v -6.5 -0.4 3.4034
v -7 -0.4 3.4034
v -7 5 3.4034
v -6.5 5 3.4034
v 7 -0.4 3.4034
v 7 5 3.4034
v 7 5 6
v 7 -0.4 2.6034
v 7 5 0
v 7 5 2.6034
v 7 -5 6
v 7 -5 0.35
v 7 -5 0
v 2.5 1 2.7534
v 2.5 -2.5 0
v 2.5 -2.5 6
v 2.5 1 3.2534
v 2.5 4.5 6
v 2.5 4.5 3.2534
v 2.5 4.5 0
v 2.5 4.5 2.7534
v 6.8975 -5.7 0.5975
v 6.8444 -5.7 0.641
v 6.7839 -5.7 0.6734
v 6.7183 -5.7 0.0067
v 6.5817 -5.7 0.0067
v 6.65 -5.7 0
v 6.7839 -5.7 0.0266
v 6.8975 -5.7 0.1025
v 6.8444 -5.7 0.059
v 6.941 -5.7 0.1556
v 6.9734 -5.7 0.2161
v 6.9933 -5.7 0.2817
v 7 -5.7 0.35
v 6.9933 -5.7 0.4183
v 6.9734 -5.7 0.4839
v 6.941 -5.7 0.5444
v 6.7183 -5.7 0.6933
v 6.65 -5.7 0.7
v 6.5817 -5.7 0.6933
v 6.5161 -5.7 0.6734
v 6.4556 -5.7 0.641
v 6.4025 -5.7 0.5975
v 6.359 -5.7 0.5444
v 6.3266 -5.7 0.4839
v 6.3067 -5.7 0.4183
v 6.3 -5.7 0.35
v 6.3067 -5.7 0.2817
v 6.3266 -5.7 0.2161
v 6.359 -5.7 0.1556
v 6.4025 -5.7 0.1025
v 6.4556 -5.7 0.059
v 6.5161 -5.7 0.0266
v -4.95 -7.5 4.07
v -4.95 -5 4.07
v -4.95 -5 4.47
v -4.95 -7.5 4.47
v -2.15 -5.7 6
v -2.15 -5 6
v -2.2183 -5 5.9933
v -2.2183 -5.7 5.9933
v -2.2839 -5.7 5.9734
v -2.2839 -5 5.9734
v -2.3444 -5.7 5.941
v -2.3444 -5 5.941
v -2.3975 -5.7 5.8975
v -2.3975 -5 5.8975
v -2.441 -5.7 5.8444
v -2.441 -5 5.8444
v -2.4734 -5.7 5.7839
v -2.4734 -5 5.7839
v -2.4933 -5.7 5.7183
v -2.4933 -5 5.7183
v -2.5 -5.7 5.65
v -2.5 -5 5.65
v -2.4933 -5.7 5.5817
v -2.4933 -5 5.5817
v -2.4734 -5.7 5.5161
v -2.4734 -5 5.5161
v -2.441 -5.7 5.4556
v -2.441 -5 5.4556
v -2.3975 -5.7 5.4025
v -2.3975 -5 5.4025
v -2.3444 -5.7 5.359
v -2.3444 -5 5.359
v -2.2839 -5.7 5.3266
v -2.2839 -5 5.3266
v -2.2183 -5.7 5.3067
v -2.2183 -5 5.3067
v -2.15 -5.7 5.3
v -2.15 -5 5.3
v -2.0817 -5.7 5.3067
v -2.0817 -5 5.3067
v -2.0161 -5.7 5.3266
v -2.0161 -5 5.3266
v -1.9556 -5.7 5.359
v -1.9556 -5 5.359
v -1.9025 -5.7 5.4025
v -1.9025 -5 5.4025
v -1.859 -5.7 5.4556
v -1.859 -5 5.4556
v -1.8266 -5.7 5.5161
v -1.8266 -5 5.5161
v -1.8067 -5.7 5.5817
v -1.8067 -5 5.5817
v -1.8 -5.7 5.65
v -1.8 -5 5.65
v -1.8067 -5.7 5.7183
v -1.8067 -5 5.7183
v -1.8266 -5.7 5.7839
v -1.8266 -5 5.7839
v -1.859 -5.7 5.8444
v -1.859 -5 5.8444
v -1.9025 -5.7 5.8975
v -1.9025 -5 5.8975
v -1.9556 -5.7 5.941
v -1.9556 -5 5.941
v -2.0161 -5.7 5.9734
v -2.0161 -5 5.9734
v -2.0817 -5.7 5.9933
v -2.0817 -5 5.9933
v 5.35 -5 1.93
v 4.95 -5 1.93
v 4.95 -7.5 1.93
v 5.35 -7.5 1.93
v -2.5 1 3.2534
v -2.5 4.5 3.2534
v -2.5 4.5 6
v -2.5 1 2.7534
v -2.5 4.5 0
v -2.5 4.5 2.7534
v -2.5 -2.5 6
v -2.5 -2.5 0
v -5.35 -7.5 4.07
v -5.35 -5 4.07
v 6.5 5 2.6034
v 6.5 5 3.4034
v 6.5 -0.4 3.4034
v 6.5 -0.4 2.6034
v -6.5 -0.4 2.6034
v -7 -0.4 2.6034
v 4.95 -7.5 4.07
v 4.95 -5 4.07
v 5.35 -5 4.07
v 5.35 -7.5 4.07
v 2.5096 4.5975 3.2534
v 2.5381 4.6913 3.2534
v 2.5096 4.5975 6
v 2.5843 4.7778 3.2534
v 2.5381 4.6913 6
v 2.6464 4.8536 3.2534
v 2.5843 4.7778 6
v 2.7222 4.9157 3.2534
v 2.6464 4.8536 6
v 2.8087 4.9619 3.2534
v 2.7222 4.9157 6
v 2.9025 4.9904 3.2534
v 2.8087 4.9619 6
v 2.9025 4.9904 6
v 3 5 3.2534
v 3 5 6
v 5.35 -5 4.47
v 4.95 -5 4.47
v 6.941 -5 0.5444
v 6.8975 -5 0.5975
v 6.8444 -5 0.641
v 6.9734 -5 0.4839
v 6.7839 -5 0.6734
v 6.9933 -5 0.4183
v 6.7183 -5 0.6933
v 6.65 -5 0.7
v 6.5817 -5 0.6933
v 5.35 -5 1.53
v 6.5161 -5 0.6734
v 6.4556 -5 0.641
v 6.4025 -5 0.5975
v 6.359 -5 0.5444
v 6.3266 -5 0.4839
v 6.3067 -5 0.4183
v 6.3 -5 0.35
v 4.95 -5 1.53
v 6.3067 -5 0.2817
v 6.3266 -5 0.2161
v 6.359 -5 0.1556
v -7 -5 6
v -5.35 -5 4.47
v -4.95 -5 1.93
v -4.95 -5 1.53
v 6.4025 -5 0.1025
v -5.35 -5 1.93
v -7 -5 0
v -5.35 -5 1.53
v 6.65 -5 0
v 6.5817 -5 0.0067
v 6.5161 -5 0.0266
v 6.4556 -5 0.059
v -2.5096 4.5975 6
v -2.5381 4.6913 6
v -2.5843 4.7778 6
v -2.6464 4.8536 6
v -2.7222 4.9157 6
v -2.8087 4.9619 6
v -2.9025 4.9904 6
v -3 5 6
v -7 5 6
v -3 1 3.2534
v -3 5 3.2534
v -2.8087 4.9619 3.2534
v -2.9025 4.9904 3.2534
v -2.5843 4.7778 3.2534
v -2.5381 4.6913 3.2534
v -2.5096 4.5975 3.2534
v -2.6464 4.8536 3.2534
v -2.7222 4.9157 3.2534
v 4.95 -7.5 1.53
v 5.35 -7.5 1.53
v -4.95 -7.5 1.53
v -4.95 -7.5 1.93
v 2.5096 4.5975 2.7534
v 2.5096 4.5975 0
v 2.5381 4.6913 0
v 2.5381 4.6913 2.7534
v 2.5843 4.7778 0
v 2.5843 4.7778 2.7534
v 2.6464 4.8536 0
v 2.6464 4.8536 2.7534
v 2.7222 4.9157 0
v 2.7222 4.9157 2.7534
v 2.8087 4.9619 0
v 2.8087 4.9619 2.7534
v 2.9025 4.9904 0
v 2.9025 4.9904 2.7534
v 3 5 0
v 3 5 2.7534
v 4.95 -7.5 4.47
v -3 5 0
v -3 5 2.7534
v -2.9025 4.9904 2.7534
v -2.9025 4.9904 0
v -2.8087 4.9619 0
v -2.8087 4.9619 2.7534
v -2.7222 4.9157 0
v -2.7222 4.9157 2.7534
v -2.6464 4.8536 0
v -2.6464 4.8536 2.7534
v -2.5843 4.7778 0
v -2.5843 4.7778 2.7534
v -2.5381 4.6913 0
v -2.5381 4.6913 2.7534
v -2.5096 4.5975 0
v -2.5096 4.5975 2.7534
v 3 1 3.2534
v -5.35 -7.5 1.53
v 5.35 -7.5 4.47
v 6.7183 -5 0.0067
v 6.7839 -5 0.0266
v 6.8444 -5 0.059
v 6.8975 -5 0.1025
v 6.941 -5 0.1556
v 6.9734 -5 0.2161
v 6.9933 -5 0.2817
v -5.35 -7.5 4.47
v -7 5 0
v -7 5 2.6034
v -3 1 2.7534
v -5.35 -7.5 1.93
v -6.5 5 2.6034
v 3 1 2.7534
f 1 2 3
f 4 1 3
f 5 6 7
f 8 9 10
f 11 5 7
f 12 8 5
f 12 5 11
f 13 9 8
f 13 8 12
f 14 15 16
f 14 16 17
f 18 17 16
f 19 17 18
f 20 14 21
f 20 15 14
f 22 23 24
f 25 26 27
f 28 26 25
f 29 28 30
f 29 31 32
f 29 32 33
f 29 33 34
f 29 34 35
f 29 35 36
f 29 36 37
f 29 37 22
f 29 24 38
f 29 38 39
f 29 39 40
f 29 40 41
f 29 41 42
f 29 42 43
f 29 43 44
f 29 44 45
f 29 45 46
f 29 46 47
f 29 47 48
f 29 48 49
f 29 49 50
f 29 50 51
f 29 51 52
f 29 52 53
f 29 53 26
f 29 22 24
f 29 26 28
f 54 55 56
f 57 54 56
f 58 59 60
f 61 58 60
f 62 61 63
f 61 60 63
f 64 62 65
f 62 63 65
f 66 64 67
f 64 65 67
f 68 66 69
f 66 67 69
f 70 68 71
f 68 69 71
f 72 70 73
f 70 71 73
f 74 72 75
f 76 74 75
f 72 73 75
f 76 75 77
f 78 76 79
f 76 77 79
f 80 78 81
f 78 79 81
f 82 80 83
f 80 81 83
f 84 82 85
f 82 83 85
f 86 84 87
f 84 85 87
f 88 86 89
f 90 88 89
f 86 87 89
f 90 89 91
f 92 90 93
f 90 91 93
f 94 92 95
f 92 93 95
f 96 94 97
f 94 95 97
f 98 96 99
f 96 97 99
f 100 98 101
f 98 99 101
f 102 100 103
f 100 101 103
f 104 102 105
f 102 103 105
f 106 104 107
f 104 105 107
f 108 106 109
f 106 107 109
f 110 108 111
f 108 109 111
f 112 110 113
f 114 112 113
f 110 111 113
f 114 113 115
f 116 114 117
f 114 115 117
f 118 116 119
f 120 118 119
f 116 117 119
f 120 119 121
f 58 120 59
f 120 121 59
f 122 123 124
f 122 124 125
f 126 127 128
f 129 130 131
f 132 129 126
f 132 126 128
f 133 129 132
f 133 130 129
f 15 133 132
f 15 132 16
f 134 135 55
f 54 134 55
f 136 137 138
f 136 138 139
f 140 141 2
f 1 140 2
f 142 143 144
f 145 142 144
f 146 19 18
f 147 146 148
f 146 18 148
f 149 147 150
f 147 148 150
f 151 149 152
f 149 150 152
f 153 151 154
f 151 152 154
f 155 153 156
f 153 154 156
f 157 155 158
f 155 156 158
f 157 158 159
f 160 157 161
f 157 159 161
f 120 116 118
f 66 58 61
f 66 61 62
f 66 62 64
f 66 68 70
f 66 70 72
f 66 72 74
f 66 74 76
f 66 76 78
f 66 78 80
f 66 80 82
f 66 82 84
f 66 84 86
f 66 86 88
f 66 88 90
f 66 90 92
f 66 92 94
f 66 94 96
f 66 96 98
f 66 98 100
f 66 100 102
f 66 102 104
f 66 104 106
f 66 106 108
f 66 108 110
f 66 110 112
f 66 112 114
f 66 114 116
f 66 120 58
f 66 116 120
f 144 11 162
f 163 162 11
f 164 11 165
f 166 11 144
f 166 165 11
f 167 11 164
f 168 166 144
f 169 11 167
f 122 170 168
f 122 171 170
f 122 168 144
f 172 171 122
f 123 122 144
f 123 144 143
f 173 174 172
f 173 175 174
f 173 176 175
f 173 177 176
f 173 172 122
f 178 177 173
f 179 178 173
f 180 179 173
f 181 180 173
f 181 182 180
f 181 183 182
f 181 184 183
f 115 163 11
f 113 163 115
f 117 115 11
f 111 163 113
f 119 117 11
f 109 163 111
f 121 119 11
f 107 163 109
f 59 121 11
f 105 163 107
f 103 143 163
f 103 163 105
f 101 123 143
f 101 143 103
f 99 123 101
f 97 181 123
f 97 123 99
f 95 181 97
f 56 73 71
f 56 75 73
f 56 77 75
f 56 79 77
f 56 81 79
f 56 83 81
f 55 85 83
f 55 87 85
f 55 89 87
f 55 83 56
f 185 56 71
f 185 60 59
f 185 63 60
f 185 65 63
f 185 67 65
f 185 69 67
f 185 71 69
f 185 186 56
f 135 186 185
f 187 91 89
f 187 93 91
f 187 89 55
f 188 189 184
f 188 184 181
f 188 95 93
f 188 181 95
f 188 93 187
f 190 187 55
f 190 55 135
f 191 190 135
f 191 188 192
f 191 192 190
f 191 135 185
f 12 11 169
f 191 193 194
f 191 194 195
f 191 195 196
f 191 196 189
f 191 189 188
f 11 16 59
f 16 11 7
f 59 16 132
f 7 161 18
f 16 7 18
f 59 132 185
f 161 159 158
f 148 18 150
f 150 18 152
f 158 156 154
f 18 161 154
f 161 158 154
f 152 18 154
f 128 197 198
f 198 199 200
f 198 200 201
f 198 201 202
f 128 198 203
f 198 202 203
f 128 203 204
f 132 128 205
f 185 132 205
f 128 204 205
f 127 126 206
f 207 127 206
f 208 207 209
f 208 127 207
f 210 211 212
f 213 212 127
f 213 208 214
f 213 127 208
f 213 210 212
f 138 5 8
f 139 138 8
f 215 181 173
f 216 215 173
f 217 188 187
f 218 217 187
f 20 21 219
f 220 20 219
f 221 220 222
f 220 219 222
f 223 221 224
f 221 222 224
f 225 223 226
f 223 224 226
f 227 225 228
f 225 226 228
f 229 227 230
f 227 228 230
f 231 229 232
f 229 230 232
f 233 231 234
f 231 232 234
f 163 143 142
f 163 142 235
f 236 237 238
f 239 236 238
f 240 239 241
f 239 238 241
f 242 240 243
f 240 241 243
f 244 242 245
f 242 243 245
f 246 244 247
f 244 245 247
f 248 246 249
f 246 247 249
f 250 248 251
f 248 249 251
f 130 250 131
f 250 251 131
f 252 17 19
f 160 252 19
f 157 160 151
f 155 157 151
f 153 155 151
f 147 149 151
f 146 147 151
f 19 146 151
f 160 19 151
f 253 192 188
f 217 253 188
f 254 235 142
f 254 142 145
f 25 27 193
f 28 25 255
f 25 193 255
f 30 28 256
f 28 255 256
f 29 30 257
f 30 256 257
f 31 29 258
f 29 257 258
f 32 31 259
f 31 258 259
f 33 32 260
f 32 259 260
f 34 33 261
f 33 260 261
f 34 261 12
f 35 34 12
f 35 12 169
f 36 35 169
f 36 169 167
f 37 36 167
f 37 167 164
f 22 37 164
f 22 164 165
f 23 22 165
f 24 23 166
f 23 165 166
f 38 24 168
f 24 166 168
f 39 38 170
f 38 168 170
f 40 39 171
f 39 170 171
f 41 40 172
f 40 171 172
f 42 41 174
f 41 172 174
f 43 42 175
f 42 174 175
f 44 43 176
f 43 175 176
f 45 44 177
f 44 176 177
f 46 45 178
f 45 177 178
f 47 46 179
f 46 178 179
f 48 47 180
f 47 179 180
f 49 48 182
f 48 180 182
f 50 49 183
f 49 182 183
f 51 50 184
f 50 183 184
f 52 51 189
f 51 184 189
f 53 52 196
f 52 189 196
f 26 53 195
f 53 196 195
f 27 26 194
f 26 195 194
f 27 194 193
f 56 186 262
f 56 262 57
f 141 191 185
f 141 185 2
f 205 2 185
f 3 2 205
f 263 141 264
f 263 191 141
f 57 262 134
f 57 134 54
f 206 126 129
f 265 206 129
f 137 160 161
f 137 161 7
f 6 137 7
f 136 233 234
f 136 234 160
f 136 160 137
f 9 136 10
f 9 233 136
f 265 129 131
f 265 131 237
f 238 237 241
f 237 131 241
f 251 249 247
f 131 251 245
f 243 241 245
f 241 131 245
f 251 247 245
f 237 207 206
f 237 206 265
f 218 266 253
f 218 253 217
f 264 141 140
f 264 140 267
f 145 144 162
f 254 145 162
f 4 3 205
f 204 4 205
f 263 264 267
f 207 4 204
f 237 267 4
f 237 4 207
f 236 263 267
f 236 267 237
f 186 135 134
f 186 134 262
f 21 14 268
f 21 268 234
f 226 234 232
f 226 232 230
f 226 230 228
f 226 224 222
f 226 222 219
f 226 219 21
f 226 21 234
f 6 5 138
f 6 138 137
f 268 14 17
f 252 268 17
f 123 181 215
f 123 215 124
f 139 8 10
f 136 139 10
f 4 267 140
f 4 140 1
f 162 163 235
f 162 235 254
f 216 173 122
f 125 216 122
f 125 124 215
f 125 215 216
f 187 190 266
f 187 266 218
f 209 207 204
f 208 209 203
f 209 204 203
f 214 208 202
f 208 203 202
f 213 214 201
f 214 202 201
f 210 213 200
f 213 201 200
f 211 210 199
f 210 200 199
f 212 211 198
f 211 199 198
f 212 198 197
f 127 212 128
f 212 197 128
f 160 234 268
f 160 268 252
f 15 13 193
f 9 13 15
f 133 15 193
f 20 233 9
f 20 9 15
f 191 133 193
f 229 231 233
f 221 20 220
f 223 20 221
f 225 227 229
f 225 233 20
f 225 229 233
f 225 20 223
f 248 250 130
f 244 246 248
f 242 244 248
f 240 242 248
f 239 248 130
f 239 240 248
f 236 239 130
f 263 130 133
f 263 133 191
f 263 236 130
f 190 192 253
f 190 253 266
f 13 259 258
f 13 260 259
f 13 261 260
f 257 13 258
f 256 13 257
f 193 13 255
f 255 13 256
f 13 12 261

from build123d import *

# Parameters (mm, degrees)
EXTRUDE_1_DEPTH     = 6
FILLET_1_R          = 0.5
SKETCH_2_W          = 0.4
SKETCH_2_H          = 0.4
EXTRUDE_2_DEPTH     = 2.5
SKETCH_3_W          = 0.8
SKETCH_3_H          = 5.4
CUT_EXTRUDE_1_DEPTH = 0.5
SKETCH_4_W          = 0.8
SKETCH_4_H          = 5.4
CUT_EXTRUDE_2_DEPTH = 0.5
SKETCH_5_W          = 0.5
SKETCH_5_H          = 4
CUT_EXTRUDE_3_DEPTH = 0.5
SKETCH_6_W          = 0.5
SKETCH_6_H          = 4
CUT_EXTRUDE_4_DEPTH = 0.5
SKETCH_7_R          = 0.35
EXTRUDE_3_DEPTH     = 0.7


with BuildPart() as part:
    # 草图1 → 凸台-拉伸1 (new body)
    with BuildSketch(Plane.XY):
        Polygon((-7, 5), (-2.5, 5), (-2.5, -2.5), (2.5, -2.5), (2.5, 5), (7, 5), (7, -5), (-7, -5), align=None)
    extrude(amount=EXTRUDE_1_DEPTH)

    # 圆角1
    fillet_1_edges = [part.edges().sort_by_distance(p)[0] for p in [
        (-2.5, 5, 3),
        (2.5, 5, 3),
    ]]
    fillet(fillet_1_edges, radius=FILLET_1_R)

    # 草图2 → 凸台-拉伸2 (add)
    with BuildSketch(Plane.XZ.offset(5)):
        with Locations((-5.15, 4.27)):
            Rectangle(SKETCH_2_W, SKETCH_2_H)
        with Locations((5.15, 4.27)):
            Rectangle(SKETCH_2_W, SKETCH_2_H)
        with Locations((-5.15, 1.73)):
            Rectangle(SKETCH_2_W, SKETCH_2_H)
        with Locations((5.15, 1.73)):
            Rectangle(SKETCH_2_W, SKETCH_2_H)
    extrude(amount=EXTRUDE_2_DEPTH)

    # 草图3 → 切除-拉伸1 (cut)
    with BuildSketch(Plane.ZY.offset(7)):
        with Locations((3.003385533, 2.3)):
            Rectangle(SKETCH_3_W, SKETCH_3_H)
    extrude(amount=-CUT_EXTRUDE_1_DEPTH, mode=Mode.SUBTRACT)

    # 草图4 → 切除-拉伸2 (cut)
    with BuildSketch(Plane(origin=(7, 0, 0), x_dir=(0, 0, -1), z_dir=(1, 0, 0))):
        with Locations((-3.003385533, 2.3)):
            Rectangle(SKETCH_4_W, SKETCH_4_H)
    extrude(amount=-CUT_EXTRUDE_2_DEPTH, mode=Mode.SUBTRACT)

    # 草图5 → 切除-拉伸3 (cut)
    with BuildSketch(Plane(origin=(-2.5, 0, 0), x_dir=(0, 0, -1), z_dir=(1, 0, 0))):
        with Locations((-3.003385533, 3)):
            Rectangle(SKETCH_5_W, SKETCH_5_H)
    extrude(amount=-CUT_EXTRUDE_3_DEPTH, mode=Mode.SUBTRACT)

    # 草图6 → 切除-拉伸4 (cut)
    with BuildSketch(Plane.ZY.offset(-2.5)):
        with Locations((3.003385533, 3)):
            Rectangle(SKETCH_6_W, SKETCH_6_H)
    extrude(amount=-CUT_EXTRUDE_4_DEPTH, mode=Mode.SUBTRACT)

    # 草图7 → 凸台-拉伸3 (add)
    with BuildSketch(Plane.XZ.offset(5)):
        with Locations(Location((-2.15, 5.65, 0), (0, 0, 90))):
            Circle(SKETCH_7_R)
        with Locations(Location((6.65, 0.35, 0), (0, 0, 270))):
            Circle(SKETCH_7_R)
    extrude(amount=EXTRUDE_3_DEPTH)


solid = part.part
